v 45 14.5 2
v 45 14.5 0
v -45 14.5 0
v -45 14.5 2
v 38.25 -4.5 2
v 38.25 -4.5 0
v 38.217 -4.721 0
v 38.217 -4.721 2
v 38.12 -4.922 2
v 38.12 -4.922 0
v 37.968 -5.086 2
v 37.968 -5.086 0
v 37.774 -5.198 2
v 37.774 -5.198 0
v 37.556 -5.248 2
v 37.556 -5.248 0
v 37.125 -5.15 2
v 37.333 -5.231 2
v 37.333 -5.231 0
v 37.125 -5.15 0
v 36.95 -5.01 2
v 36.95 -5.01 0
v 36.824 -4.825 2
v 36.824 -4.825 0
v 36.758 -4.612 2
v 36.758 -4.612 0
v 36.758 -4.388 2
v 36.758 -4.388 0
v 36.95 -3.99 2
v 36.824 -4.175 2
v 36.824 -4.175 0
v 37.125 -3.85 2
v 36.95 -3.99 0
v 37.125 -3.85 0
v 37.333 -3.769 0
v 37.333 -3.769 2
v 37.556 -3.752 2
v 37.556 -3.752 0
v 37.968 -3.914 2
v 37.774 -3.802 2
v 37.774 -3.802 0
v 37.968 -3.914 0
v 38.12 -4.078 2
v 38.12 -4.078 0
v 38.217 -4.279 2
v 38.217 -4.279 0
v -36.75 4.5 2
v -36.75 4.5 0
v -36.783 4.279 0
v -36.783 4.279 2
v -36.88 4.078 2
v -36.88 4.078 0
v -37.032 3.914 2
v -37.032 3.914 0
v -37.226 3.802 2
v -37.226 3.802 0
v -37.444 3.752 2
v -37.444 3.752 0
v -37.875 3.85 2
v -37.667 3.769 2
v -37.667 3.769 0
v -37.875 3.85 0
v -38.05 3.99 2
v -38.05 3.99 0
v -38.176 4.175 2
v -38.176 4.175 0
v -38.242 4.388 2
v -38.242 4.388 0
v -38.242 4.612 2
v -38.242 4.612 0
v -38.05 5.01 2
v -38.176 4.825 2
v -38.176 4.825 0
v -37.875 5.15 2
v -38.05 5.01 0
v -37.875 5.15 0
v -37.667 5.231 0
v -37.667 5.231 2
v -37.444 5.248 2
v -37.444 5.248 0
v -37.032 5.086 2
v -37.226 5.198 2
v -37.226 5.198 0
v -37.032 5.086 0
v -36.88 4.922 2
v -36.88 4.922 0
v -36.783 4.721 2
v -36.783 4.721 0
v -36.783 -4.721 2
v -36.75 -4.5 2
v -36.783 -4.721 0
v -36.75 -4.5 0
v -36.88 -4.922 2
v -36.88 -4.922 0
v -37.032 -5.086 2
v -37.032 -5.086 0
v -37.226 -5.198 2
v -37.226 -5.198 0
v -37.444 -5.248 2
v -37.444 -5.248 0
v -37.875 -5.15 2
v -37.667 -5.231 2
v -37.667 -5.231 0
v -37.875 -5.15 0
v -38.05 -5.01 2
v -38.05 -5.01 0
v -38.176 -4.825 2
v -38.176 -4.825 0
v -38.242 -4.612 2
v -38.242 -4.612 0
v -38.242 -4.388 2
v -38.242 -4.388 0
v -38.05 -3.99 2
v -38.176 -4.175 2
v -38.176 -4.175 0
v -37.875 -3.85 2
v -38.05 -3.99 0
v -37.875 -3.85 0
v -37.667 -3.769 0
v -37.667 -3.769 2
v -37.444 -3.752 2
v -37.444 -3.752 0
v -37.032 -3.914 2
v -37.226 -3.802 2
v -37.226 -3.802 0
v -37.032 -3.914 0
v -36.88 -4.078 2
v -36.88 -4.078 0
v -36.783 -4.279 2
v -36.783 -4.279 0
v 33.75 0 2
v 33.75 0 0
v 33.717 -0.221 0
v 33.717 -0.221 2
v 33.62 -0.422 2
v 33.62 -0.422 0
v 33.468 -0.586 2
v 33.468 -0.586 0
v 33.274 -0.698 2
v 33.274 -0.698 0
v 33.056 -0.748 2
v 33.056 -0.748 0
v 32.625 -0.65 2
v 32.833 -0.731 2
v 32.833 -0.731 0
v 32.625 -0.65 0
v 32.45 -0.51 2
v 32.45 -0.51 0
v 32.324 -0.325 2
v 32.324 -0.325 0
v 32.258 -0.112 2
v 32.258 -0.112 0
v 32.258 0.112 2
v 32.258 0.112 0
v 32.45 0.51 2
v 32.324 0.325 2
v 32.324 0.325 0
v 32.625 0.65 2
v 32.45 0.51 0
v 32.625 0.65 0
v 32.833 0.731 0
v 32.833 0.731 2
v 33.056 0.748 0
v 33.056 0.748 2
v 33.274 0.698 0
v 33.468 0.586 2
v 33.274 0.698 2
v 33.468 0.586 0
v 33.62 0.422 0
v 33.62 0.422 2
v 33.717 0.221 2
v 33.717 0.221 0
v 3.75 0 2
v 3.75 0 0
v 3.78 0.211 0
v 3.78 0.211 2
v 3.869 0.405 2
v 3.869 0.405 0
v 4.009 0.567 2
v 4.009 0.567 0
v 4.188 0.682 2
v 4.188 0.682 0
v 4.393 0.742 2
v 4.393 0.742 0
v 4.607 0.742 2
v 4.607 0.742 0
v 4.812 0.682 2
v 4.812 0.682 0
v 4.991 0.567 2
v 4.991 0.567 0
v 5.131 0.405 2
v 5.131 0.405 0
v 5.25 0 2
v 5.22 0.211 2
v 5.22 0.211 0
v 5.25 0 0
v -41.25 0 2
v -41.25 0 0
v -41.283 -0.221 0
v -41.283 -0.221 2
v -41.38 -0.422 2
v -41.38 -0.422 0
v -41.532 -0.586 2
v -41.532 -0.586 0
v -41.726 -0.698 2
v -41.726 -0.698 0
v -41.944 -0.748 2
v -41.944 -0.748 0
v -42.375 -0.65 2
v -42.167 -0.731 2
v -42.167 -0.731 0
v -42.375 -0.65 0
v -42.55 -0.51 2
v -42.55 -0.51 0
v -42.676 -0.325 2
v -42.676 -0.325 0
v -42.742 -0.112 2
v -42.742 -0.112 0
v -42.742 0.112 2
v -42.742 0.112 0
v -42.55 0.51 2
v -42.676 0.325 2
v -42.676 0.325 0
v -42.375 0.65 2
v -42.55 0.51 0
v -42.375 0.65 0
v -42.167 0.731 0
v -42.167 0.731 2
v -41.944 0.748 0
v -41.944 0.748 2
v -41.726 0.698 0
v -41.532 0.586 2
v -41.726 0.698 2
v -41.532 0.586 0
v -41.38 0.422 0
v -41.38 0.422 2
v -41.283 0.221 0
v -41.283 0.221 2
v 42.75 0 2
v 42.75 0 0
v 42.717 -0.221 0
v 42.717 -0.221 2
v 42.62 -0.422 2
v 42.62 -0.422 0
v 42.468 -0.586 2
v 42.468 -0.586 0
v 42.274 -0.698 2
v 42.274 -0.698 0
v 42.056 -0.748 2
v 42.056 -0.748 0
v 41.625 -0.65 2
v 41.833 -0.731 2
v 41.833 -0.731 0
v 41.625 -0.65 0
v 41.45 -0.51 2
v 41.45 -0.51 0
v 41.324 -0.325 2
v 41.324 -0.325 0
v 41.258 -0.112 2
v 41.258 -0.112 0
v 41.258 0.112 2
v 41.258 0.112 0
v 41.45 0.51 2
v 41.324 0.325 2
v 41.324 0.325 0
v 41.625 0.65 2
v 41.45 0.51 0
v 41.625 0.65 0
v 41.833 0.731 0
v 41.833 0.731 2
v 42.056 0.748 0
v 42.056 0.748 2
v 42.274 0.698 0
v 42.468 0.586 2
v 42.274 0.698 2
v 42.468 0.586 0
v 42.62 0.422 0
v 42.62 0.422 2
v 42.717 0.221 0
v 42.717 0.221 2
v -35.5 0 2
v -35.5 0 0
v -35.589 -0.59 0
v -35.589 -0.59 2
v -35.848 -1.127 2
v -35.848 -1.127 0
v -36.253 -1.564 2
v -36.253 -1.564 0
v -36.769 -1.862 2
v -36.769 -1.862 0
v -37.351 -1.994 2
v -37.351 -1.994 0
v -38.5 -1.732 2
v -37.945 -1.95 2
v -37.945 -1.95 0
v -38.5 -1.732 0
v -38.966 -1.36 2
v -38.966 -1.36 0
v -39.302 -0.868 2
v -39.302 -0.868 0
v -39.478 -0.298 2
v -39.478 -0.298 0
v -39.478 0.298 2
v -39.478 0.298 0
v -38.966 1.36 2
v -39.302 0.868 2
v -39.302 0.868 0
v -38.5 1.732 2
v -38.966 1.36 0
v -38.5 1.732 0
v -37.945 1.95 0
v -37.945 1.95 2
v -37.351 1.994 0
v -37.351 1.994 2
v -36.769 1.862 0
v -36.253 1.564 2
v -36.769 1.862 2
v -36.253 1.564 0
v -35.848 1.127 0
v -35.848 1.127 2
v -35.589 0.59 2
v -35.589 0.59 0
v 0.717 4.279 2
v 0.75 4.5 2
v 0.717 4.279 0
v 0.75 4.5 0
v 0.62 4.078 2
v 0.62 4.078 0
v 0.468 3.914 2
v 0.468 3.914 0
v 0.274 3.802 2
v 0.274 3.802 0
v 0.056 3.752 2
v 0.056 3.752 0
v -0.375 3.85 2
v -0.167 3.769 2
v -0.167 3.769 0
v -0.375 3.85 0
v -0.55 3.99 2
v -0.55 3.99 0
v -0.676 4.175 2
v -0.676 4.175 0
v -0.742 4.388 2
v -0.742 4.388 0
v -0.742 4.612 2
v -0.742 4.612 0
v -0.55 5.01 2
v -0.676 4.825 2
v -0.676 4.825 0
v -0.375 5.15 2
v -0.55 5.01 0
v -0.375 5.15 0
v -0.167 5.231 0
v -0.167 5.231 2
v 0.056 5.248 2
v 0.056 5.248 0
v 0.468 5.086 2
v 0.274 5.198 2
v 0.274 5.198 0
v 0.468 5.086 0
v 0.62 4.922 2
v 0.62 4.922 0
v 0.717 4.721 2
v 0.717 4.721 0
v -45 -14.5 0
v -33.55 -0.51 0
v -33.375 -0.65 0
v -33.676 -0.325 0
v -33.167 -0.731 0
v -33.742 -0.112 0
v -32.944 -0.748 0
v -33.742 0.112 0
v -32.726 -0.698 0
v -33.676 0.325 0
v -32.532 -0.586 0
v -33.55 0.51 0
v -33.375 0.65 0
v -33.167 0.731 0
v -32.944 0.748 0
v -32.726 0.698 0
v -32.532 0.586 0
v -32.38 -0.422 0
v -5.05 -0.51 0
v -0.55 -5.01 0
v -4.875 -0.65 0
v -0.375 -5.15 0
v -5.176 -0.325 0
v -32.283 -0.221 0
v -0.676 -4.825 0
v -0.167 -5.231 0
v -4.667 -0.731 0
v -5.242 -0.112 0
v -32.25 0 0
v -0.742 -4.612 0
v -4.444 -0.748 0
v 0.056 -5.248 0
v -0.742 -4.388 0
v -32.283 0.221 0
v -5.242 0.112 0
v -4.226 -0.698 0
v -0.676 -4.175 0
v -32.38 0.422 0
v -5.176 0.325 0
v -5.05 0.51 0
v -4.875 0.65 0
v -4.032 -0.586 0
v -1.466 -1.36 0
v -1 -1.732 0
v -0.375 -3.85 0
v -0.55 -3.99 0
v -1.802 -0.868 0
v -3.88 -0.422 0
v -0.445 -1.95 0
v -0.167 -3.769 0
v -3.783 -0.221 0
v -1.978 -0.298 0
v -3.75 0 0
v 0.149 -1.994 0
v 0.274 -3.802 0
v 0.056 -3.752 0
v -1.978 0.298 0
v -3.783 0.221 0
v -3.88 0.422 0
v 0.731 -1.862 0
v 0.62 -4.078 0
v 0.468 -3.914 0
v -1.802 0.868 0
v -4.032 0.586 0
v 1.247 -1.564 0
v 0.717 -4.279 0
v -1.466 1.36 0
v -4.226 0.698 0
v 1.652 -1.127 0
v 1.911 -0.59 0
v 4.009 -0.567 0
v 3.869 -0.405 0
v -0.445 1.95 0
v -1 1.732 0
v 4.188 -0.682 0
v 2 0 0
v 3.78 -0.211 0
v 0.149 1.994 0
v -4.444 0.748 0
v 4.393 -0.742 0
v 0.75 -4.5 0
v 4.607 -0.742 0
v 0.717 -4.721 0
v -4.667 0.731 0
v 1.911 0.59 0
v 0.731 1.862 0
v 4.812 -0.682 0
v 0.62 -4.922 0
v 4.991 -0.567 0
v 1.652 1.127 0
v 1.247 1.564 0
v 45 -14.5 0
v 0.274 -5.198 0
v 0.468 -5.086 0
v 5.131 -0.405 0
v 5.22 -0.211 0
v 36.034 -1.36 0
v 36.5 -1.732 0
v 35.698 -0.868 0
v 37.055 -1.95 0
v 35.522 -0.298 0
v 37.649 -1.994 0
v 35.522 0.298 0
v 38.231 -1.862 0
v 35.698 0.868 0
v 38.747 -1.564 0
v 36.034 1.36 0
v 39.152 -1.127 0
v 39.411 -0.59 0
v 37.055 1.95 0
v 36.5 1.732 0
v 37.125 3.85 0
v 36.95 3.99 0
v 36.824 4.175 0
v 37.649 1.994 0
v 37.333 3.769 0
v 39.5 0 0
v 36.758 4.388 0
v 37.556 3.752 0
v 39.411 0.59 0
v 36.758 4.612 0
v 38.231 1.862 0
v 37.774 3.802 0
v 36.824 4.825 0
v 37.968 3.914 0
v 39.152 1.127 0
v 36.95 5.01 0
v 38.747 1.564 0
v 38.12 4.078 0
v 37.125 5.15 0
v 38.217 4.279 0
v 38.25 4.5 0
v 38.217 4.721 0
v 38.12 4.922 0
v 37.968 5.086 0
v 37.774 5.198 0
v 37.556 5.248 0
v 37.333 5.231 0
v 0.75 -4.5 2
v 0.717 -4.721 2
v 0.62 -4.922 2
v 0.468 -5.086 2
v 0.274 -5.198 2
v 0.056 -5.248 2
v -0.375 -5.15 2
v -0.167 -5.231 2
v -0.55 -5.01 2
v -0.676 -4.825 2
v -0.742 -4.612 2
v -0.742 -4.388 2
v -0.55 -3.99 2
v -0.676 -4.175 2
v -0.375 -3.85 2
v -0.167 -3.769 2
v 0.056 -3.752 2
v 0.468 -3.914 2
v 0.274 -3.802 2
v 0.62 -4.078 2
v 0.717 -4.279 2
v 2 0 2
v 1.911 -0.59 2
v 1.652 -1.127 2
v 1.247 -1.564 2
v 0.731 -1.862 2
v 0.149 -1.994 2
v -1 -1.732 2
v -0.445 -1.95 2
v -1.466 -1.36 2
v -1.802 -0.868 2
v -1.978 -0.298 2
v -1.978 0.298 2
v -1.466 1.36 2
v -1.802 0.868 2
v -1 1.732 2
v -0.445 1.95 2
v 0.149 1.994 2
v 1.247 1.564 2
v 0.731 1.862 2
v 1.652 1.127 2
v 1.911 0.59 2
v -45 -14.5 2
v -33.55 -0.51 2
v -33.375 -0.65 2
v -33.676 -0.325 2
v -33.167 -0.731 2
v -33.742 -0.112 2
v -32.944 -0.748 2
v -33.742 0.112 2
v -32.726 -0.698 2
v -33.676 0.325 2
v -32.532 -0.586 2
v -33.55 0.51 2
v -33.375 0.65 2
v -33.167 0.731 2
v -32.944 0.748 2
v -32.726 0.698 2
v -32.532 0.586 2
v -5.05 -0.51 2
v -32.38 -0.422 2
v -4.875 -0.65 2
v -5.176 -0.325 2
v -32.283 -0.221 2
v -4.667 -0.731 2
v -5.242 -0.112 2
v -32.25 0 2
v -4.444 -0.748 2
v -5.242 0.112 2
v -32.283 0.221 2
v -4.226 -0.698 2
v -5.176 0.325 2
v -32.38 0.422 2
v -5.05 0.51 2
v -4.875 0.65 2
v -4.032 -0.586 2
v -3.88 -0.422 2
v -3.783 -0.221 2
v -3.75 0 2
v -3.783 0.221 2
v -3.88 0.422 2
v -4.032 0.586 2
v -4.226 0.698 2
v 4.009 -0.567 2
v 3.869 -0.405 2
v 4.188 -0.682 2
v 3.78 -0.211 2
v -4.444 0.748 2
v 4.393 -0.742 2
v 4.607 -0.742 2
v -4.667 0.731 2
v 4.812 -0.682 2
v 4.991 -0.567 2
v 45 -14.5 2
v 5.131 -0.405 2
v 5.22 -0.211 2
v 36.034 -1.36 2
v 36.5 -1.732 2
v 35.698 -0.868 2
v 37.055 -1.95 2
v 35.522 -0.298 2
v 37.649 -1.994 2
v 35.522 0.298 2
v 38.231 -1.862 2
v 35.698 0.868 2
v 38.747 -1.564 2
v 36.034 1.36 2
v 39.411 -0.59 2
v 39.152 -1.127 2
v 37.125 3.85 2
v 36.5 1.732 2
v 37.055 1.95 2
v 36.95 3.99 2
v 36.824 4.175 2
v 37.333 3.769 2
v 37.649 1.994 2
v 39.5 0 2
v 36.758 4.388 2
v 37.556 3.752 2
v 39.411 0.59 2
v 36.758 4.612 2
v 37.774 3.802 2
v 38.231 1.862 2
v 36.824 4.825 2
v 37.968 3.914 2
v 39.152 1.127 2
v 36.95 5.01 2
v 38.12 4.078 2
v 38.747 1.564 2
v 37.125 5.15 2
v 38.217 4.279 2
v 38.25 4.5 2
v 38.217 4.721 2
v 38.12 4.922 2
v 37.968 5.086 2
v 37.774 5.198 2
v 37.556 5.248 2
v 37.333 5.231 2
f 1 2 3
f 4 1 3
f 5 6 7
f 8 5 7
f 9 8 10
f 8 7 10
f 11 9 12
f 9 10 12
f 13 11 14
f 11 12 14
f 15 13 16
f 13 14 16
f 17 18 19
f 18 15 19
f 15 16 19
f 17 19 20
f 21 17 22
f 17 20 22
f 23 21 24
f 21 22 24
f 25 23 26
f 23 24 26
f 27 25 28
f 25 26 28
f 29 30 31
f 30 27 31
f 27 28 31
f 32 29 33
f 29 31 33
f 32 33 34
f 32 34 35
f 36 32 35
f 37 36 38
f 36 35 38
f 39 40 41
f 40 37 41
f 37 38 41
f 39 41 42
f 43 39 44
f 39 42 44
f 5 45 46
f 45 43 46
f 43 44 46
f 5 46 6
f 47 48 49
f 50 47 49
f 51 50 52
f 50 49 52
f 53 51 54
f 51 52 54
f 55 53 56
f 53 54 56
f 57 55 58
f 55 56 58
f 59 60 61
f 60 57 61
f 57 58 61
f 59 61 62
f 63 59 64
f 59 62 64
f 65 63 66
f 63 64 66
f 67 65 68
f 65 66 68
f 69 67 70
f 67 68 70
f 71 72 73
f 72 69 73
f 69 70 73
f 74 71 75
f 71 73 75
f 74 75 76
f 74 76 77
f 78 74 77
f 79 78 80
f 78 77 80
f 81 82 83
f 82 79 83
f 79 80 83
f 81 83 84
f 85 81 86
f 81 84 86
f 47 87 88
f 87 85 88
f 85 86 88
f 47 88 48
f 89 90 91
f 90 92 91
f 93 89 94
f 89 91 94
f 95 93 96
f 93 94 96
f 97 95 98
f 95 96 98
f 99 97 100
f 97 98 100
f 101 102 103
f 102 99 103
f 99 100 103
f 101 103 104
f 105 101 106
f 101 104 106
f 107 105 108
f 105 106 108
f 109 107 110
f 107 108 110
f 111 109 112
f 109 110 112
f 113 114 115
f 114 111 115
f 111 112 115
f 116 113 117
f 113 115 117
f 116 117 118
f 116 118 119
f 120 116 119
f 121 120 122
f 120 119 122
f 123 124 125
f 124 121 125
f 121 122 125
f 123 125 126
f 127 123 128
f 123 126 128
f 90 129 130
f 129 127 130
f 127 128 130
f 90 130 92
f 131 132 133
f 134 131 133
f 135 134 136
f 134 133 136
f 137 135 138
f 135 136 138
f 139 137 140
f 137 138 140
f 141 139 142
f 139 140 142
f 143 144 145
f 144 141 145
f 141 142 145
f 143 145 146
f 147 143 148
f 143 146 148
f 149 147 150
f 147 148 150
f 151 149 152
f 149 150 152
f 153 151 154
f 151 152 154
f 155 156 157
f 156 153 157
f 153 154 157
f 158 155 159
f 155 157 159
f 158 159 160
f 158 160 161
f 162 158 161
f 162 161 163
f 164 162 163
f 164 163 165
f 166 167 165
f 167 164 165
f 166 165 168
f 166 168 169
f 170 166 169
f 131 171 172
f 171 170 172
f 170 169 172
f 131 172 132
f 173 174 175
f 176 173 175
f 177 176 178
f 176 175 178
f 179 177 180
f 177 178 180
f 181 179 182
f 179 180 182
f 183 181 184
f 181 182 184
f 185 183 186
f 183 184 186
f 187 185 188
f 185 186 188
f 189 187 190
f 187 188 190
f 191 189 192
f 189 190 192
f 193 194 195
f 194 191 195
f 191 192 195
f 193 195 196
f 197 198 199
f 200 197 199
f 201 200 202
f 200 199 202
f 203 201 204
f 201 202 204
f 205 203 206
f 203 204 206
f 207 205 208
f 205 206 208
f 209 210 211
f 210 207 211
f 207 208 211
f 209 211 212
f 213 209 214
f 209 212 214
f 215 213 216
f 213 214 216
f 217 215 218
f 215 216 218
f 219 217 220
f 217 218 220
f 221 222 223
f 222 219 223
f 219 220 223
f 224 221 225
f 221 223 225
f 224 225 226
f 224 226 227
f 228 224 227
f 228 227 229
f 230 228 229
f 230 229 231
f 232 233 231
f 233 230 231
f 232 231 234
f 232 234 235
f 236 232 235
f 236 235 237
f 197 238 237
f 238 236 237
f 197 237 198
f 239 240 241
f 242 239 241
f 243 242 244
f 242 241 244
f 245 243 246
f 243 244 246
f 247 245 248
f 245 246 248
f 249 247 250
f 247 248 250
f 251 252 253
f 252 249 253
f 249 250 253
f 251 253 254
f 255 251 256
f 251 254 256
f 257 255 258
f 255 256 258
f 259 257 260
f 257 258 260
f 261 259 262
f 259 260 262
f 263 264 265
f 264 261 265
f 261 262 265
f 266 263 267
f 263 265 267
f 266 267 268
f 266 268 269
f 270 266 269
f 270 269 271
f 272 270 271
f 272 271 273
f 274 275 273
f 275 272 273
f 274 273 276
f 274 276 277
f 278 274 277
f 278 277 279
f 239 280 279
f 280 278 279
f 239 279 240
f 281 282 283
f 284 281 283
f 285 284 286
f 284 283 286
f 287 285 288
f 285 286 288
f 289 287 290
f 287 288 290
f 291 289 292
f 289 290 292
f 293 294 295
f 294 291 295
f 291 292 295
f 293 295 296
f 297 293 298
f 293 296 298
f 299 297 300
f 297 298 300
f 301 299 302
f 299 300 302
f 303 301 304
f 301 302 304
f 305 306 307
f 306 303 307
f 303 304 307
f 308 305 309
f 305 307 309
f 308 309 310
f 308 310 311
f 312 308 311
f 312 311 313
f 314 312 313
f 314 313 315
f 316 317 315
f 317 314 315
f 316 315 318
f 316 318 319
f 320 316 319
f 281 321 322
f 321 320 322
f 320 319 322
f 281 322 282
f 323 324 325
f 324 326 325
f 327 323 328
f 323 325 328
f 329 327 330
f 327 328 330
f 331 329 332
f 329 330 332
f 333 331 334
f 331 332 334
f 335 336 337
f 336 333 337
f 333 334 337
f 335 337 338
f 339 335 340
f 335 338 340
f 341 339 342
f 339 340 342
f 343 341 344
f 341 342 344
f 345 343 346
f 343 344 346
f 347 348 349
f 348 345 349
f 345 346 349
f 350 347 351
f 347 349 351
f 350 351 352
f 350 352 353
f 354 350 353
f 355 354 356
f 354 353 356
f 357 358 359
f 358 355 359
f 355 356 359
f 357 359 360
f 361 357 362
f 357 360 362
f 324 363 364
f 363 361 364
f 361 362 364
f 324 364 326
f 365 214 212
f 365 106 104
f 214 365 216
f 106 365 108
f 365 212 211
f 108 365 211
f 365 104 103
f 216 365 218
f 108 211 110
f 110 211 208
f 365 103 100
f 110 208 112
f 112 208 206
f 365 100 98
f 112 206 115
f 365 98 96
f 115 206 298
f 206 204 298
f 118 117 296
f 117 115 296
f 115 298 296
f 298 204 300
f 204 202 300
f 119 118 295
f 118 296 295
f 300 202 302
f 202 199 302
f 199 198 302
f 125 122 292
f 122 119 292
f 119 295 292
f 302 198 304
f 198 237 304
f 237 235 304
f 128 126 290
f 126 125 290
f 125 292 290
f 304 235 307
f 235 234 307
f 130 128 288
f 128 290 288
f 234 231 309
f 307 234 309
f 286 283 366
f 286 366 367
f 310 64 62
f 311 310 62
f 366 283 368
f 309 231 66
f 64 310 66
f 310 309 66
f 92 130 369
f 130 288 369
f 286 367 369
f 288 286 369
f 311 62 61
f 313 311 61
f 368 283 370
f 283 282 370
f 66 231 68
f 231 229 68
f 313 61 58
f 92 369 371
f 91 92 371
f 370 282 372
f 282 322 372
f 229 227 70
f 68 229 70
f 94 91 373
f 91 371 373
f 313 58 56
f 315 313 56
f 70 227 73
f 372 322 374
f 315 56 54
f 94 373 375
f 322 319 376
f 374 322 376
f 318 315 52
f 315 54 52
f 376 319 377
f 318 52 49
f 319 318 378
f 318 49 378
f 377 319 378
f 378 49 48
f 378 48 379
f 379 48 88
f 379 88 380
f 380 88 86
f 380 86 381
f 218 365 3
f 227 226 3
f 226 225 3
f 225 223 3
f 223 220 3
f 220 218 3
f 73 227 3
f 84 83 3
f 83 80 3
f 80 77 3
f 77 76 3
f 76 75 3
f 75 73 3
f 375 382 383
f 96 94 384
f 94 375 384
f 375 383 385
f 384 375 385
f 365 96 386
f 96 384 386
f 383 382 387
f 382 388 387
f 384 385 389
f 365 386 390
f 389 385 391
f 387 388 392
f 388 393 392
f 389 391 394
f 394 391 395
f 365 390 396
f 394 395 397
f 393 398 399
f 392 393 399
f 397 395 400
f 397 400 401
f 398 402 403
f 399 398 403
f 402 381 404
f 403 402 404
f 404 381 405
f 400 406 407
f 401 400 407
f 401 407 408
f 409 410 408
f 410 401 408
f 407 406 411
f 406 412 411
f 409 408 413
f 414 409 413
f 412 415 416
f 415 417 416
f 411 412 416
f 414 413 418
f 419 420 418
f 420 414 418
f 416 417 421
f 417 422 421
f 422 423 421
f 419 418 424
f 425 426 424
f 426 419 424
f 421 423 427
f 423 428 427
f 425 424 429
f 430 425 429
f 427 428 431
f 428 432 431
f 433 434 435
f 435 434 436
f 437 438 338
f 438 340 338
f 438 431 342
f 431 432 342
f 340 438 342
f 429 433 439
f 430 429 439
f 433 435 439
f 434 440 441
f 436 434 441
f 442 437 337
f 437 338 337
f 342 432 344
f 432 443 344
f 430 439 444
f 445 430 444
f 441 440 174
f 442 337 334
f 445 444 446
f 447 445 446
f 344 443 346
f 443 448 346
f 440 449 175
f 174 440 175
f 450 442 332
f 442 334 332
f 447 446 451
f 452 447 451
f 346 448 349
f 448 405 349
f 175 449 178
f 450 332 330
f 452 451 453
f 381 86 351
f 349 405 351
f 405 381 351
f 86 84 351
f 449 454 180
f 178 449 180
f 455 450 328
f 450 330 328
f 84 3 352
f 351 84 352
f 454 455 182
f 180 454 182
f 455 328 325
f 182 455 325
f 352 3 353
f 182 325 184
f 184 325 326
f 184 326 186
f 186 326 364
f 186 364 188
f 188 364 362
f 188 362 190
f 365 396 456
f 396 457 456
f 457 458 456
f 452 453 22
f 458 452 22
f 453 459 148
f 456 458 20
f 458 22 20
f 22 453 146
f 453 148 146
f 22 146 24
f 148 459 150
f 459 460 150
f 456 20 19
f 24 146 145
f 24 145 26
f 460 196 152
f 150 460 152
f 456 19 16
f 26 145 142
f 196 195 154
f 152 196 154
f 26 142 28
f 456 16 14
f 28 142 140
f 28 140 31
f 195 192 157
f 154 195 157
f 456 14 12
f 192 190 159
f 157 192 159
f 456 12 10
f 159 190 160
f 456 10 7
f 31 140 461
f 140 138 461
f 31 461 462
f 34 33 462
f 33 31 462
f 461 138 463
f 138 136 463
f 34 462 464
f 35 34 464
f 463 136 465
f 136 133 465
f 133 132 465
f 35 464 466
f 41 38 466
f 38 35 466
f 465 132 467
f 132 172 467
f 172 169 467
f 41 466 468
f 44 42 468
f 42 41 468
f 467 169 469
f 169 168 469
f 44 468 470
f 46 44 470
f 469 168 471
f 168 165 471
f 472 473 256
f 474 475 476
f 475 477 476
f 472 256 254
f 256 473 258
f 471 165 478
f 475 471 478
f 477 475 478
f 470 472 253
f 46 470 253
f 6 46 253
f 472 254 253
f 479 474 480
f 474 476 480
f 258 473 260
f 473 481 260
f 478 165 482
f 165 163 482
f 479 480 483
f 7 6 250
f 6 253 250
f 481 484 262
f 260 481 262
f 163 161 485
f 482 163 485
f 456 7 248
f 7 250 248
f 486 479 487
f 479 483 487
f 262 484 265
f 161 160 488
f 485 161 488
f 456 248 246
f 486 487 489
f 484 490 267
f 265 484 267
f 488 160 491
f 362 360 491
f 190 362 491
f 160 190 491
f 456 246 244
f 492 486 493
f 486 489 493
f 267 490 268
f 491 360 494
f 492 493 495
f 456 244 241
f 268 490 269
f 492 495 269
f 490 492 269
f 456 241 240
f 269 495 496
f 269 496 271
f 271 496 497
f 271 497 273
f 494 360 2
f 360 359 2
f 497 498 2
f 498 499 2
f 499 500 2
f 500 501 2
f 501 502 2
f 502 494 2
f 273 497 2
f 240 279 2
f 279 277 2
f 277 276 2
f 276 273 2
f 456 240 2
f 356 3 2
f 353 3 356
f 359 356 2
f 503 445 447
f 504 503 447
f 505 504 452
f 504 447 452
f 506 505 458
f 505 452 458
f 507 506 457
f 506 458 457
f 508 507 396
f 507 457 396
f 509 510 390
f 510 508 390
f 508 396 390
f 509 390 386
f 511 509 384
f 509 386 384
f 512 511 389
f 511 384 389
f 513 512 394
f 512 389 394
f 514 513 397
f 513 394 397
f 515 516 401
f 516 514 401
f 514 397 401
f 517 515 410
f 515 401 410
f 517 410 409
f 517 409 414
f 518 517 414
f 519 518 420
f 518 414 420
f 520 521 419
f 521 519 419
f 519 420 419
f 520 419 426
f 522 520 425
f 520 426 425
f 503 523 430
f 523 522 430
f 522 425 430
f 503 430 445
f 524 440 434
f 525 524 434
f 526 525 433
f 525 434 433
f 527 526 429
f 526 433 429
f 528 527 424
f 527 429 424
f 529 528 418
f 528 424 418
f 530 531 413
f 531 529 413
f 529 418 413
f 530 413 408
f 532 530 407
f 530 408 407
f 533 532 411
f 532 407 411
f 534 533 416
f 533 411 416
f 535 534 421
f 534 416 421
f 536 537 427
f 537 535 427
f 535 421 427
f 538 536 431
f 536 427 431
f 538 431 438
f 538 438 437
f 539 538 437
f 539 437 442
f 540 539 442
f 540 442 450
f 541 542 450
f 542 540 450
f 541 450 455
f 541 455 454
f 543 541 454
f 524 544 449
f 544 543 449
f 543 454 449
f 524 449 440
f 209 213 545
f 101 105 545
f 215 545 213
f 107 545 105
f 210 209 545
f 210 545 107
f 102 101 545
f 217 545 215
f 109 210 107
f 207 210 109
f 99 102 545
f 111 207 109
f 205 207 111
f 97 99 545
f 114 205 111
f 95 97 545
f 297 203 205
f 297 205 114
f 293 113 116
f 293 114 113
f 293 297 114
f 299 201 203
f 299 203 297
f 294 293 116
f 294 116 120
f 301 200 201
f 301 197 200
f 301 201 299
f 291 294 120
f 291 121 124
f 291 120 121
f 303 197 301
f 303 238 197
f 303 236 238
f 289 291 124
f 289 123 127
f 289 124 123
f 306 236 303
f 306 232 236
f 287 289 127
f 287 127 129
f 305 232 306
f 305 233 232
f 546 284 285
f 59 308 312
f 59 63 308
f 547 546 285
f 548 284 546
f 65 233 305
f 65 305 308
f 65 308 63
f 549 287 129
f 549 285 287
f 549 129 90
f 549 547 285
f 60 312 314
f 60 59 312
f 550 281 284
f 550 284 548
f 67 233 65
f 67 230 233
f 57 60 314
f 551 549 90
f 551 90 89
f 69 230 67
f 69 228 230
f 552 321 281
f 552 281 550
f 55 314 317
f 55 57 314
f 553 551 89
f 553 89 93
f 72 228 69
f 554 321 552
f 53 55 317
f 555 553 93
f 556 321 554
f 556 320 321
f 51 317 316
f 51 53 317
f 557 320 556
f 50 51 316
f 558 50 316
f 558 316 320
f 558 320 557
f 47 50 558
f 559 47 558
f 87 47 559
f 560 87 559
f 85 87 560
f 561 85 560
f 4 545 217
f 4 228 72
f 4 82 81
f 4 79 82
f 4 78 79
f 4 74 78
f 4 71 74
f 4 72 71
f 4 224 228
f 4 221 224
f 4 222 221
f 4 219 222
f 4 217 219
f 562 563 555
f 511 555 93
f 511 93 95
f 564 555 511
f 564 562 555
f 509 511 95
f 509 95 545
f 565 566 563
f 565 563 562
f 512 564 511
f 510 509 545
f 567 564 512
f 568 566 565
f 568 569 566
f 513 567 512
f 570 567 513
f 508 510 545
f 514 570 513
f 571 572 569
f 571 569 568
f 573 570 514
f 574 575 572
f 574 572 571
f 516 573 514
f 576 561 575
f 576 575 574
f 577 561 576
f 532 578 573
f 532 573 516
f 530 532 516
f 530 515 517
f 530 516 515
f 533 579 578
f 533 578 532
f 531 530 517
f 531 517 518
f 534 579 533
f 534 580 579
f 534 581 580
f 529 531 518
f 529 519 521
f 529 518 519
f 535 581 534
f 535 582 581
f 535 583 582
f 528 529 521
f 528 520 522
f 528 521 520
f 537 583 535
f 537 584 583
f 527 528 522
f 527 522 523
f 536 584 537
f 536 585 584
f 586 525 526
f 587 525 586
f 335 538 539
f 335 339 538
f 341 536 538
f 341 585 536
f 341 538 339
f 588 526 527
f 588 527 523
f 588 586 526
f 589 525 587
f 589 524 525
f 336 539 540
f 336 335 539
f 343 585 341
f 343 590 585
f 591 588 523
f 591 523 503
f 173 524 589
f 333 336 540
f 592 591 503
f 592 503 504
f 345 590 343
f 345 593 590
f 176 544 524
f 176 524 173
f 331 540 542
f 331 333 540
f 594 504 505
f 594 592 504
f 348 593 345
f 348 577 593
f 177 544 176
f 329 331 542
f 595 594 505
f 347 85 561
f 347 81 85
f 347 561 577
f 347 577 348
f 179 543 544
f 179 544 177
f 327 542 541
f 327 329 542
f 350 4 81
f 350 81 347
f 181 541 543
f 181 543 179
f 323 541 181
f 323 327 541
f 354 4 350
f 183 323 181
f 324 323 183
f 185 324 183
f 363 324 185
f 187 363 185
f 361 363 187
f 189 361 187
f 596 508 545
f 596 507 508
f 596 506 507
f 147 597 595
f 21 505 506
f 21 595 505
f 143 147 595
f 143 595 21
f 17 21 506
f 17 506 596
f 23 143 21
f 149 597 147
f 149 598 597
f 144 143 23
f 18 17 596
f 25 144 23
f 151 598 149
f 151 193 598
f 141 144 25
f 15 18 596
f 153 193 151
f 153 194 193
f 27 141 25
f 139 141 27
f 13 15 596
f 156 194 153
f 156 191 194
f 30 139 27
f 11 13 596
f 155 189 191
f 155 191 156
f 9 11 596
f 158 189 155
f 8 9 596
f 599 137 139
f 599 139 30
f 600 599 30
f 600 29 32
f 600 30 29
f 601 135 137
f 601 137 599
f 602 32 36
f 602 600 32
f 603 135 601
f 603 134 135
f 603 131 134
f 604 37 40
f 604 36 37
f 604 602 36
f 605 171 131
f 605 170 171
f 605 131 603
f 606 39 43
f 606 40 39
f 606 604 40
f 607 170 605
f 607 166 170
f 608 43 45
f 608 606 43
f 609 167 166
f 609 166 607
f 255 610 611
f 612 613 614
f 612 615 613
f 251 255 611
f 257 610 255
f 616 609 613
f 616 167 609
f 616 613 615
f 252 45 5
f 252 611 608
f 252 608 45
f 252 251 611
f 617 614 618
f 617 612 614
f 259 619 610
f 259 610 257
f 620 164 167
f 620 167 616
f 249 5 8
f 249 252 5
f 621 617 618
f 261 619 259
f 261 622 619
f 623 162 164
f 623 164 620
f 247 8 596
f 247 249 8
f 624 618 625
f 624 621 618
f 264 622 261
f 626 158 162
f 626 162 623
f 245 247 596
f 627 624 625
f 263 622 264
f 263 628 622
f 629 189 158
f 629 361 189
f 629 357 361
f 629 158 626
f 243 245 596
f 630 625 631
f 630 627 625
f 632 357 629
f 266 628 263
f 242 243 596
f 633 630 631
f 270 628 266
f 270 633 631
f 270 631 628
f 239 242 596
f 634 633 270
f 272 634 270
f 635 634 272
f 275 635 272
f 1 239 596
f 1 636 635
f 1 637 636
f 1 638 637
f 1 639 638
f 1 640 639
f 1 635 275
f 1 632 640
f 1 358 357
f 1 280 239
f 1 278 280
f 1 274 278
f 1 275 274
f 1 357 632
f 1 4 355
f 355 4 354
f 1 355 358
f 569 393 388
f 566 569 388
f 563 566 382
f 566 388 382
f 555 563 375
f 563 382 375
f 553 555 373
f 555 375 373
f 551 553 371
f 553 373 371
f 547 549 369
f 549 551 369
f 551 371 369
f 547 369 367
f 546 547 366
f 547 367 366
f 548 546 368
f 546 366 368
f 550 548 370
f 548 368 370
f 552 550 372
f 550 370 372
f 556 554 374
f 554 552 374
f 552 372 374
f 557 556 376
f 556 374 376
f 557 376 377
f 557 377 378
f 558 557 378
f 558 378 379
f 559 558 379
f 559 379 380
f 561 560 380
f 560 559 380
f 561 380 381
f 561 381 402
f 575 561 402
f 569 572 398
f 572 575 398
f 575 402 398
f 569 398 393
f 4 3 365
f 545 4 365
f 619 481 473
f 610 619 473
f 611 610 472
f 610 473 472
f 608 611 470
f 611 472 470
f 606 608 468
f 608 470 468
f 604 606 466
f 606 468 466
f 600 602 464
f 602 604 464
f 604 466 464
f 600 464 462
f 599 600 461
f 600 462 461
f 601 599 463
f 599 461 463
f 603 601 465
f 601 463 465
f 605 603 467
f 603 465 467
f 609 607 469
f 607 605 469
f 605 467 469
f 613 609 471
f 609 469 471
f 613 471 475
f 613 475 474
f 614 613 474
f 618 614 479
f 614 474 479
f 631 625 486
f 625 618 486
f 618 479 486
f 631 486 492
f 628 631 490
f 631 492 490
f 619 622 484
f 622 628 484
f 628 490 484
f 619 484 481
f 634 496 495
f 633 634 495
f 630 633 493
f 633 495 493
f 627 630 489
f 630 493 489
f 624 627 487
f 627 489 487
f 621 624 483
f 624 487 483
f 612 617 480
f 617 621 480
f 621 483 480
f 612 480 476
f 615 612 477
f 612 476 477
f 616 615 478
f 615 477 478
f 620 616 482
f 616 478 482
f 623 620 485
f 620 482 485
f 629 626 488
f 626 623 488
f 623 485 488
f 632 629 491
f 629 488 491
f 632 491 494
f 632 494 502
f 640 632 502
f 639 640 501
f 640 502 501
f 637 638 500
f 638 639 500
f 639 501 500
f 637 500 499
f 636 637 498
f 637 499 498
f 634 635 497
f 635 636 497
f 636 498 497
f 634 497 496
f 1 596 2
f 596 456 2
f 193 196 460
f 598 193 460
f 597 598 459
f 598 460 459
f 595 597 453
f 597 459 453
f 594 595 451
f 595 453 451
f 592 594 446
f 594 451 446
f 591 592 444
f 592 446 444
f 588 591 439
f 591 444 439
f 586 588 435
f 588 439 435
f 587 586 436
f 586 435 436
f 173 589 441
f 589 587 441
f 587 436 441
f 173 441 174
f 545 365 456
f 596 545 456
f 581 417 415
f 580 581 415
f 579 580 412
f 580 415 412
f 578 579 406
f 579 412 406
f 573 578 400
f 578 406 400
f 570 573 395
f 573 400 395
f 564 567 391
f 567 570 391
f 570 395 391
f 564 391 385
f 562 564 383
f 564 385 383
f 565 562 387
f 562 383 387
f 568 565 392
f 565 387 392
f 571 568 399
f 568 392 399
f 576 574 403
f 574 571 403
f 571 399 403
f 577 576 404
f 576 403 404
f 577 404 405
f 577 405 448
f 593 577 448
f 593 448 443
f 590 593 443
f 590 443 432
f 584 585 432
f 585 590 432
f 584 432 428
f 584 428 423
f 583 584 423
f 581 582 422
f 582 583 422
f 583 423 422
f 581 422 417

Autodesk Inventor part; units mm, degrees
ref_plane "YZ Plane" through (0, 0, 0) normal (1, 0, 0) x (0, 1, 0)
ref_plane "XZ Plane" through (0, 0, 0) normal (0, 1, 0) x (-1, 0, 0)
ref_plane "XY Plane" through (0, 0, 0) normal (0, 0, 1) x (1, 0, 0)
sketch "Boceto1" plane through (0, 0, 0) normal (0, 0, 1) x (1, 0, 0)
  line L0 (-45, -14.5) -> (45, -14.5)
  line L1 (45, -14.5) -> (45, 14.5)
  line L2 (45, 14.5) -> (-45, 14.5)
  line L3 (-45, 14.5) -> (-45, -14.5)
  line L4 (45, -14.5) -> (-45, 14.5) construction
  circle A0 centre (0, 0) radius 2
  line L5 (0, 0) -> (4.5, 0) construction
  line L6 (0, 0) -> (4.5, 0)
  circle A1 centre (0, 4.5) radius 0.75
  circle A2 centre (4.5, 0) radius 0.75
  circle A3 centre (0, -4.5) radius 0.75
  circle A4 centre (-4.5, 0) radius 0.75
  circle A5 centre (-42, 0) radius 0.75
  circle A6 centre (-37.5, 0) radius 2
  circle A7 centre (-33, 0) radius 0.75
  circle A8 centre (-37.5, 4.5) radius 0.75
  circle A9 centre (-37.5, -4.5) radius 0.75
  circle A10 centre (37.5, 0) radius 2
  circle A11 centre (42, 0) radius 0.75
  circle A12 centre (37.5, 4.5) radius 0.75
  circle A13 centre (33, 0) radius 0.75
  circle A14 centre (37.5, -4.5) radius 0.75
  dimension "d0" = 90
  dimension "d1" = 29
  dimension "d2" = 4
  dimension "d8" = 1.5
  dimension "d9" = 1.5
  dimension "d10" = 1.5
  dimension "d11" = 1.5
  dimension "d23" = 4
  dimension "d25" = 1.5
  dimension "d28" = 1.5
  dimension "d29" = 1.5
  dimension "d35" = 4
  dimension "d36" = 1.5
  dimension "d37" = 1.5
  dimension "d38" = 1.5
  dimension "d39" = 1.5
extrude "Extrusión1" add sketch "Boceto1" along normal blind 2
properties part number "frontal2" material "Acero, galvanizado"
